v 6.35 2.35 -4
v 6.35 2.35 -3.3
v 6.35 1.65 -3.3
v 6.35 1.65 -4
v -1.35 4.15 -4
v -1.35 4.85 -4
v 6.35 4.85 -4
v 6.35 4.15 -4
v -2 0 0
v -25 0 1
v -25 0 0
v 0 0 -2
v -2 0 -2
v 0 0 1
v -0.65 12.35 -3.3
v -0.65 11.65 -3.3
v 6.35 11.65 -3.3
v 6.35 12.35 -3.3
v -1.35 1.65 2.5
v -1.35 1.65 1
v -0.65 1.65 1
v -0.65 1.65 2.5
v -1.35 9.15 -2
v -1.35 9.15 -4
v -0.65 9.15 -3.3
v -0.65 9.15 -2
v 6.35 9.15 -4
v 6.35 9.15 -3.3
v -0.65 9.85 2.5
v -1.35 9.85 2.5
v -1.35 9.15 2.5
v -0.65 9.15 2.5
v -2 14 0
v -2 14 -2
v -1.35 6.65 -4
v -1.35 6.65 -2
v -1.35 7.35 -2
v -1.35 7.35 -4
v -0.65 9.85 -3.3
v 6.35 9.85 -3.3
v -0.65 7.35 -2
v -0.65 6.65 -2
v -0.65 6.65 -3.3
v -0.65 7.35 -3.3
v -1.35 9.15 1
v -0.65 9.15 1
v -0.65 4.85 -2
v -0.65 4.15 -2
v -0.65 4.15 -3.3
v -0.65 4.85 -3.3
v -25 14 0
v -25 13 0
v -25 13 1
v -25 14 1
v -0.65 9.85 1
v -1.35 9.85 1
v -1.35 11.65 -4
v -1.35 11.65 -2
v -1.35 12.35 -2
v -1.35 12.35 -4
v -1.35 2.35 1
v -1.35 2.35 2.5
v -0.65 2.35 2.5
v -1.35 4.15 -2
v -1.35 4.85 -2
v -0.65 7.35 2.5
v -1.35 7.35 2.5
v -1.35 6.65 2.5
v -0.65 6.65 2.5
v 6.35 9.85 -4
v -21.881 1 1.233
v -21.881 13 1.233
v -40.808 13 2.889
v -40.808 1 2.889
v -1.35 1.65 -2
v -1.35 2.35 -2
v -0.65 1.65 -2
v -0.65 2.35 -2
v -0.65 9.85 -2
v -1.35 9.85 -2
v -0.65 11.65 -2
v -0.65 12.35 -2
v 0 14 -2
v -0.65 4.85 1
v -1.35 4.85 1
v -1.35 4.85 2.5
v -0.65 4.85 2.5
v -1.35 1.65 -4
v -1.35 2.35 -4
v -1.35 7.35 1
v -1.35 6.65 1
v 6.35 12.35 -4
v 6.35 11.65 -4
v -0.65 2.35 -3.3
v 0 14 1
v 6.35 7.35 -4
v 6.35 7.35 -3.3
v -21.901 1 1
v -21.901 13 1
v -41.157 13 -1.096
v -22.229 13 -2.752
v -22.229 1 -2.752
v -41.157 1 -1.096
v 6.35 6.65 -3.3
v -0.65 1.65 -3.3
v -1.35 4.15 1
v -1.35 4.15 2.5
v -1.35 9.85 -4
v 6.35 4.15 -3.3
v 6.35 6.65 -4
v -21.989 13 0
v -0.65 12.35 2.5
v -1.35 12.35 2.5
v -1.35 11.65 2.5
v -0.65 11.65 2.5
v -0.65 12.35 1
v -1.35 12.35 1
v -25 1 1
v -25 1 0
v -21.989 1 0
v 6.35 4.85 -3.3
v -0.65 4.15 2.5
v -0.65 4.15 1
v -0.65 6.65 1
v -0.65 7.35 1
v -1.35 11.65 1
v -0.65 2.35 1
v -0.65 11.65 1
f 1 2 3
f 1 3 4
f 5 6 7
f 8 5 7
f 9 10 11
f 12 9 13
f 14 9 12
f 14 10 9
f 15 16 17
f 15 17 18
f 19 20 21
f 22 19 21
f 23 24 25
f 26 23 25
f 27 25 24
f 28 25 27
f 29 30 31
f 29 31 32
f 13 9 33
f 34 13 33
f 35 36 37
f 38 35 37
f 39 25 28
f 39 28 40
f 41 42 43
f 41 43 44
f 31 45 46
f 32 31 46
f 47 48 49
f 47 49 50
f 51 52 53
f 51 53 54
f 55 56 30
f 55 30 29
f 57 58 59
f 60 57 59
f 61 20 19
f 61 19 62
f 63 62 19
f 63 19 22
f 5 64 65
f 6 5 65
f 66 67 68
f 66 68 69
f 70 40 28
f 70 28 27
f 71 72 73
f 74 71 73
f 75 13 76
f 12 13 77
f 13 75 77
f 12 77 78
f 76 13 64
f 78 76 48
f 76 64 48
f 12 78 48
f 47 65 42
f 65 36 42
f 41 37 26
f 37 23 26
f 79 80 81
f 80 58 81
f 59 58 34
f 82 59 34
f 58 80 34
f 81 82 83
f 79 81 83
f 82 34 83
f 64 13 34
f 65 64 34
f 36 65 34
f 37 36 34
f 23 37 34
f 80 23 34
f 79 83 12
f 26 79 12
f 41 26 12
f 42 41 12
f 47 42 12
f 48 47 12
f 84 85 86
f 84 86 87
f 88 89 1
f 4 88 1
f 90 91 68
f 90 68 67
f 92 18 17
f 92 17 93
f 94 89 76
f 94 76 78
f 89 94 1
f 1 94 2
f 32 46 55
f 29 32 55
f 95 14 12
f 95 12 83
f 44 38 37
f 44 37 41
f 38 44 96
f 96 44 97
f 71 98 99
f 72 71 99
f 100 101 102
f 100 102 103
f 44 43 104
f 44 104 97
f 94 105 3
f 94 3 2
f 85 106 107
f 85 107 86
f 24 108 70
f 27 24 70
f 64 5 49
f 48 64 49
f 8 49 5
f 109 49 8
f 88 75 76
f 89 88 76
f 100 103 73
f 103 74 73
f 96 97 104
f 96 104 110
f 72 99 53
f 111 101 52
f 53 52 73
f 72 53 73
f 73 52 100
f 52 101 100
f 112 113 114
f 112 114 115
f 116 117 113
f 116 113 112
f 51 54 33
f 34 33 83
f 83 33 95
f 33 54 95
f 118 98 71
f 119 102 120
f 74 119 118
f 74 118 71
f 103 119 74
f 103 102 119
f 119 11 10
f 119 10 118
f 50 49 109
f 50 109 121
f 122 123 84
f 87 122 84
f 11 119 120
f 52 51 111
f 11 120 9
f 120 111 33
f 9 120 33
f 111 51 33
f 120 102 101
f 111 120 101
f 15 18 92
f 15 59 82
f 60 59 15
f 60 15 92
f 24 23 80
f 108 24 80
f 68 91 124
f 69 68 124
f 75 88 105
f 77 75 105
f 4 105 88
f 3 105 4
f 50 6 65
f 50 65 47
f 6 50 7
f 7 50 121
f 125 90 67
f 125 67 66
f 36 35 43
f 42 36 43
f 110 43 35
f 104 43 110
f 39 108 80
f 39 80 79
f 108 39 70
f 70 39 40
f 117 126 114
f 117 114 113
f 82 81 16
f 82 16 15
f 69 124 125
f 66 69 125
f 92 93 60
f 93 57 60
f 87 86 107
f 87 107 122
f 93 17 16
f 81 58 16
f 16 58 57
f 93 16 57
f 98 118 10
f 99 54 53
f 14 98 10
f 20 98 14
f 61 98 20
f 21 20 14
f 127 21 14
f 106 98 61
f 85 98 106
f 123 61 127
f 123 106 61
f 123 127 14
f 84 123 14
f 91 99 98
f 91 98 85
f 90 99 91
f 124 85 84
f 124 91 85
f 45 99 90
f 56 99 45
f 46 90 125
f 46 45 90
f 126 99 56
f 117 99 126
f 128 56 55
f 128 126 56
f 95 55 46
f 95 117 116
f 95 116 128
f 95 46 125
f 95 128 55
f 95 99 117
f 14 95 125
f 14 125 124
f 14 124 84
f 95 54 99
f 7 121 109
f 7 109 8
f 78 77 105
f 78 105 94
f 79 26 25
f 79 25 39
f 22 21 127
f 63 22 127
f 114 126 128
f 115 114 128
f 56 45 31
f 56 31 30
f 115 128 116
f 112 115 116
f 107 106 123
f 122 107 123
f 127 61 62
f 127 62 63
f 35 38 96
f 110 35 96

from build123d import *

# Parameters (mm, degrees)
SKETCH_1_W      = 25
SKETCH_1_H      = 14
EXTRUDE_1_DEPTH = 1
SKETCH_1_3_W    = 2
SKETCH_1_3_H    = 14
SKETCH_1_3_W_2  = 0.7
SKETCH_1_3_H_2  = 0.7
EXTRUDE_2_DEPTH = 2
SKETCH_1_4_W    = 0.7
SKETCH_1_4_H    = 0.7
EXTRUDE_3_DEPTH = 2.5
SKETCH_1_5_W    = 0.7
SKETCH_1_5_H    = 0.7
EXTRUDE_4_DEPTH = 4
SKETCH_2_W      = 0.7
SKETCH_2_H      = 0.7
EXTRUDE_5_DEPTH = 7
SKETCH_4_W      = 19
SKETCH_4_H      = 12
EXTRUDE_6_DEPTH = 2.5
SKETCH_4_2_W    = 19
SKETCH_4_2_H    = 12
EXTRUDE_7_DEPTH = 1.5


with BuildPart() as part:
    # Эскиз1 → Бобышка-Вытянуть1 (new body)
    with BuildSketch(Plane.XY):
        with Locations((-12.5, 7)):
            Rectangle(SKETCH_1_W, SKETCH_1_H)
    extrude(amount=EXTRUDE_1_DEPTH)

    # Эскиз1<3> → Бобышка-Вытянуть2 (add)
    with BuildSketch(Plane.XY):
        with Locations((-1, 7)):
            Rectangle(SKETCH_1_3_W, SKETCH_1_3_H)
        with Locations((-1, 2)):
            Rectangle(SKETCH_1_3_W_2, SKETCH_1_3_H_2, mode=Mode.SUBTRACT)
        with Locations((-1, 4.5)):
            Rectangle(SKETCH_1_3_W_2, SKETCH_1_3_H_2, mode=Mode.SUBTRACT)
        with Locations((-1, 7)):
            Rectangle(SKETCH_1_3_W_2, SKETCH_1_3_H_2, mode=Mode.SUBTRACT)
        with Locations((-1, 9.5)):
            Rectangle(SKETCH_1_3_W_2, SKETCH_1_3_H_2, mode=Mode.SUBTRACT)
        with Locations((-1, 12)):
            Rectangle(SKETCH_1_3_W_2, SKETCH_1_3_H_2, mode=Mode.SUBTRACT)
    extrude(amount=-EXTRUDE_2_DEPTH)

    # Эскиз1<4> → Бобышка-Вытянуть3 (add)
    with BuildSketch(Plane.XY):
        with Locations((-1, 4.5)):
            Rectangle(SKETCH_1_4_W, SKETCH_1_4_H)
        with Locations((-1, 2)):
            Rectangle(SKETCH_1_4_W, SKETCH_1_4_H)
        with Locations((-1, 7)):
            Rectangle(SKETCH_1_4_W, SKETCH_1_4_H)
        with Locations((-1, 9.5)):
            Rectangle(SKETCH_1_4_W, SKETCH_1_4_H)
        with Locations((-1, 12)):
            Rectangle(SKETCH_1_4_W, SKETCH_1_4_H)
    extrude(amount=EXTRUDE_3_DEPTH)

    # Эскиз1<5> → Бобышка-Вытянуть4 (add)
    with BuildSketch(Plane.XY):
        with Locations((-1, 4.5)):
            Rectangle(SKETCH_1_5_W, SKETCH_1_5_H)
        with Locations((-1, 2)):
            Rectangle(SKETCH_1_5_W, SKETCH_1_5_H)
        with Locations((-1, 7)):
            Rectangle(SKETCH_1_5_W, SKETCH_1_5_H)
        with Locations((-1, 9.5)):
            Rectangle(SKETCH_1_5_W, SKETCH_1_5_H)
        with Locations((-1, 12)):
            Rectangle(SKETCH_1_5_W, SKETCH_1_5_H)
    extrude(amount=-EXTRUDE_4_DEPTH)

    # Эскиз2 → Бобышка-Вытянуть5 (add)
    with BuildSketch(Plane(origin=(-0.65, 0, 0), x_dir=(0, 0, -1), z_dir=(1, 0, 0))):
        with Locations((3.65, 12)):
            Rectangle(SKETCH_2_W, SKETCH_2_H)
        with Locations((3.65, 9.5)):
            Rectangle(SKETCH_2_W, SKETCH_2_H)
        with Locations((3.65, 7)):
            Rectangle(SKETCH_2_W, SKETCH_2_H)
        with Locations((3.65, 4.5)):
            Rectangle(SKETCH_2_W, SKETCH_2_H)
        with Locations((3.65, 2)):
            Rectangle(SKETCH_2_W, SKETCH_2_H)
    extrude(amount=EXTRUDE_5_DEPTH)



with BuildPart() as body_2:
    # Эскиз4 → Бобышка-Вытянуть6 (new body)
    with BuildSketch(Plane(origin=(-0.189903087, 0, -2.170602221), x_dir=(-0.9961946980917455, 0, 0.08715574274765837), z_dir=(-0.08715574274765839, 0, -0.9961946980917457))):
        with Locations((31.404867452, 7)):
            Rectangle(SKETCH_4_W, SKETCH_4_H)
    extrude(amount=EXTRUDE_6_DEPTH)


with BuildPart() as part_1:
    add(part.part)

    add(body_2.part)  # Бобышка-Вытянуть7 merges body 2
    # Эскиз4<2> → Бобышка-Вытянуть7 (add)
    with BuildSketch(Plane(origin=(-0.189903087, 0, -2.170602221), x_dir=(-0.9961946980917455, 0, 0.08715574274765837), z_dir=(-0.08715574274765839, 0, -0.9961946980917457))):
        with Locations((31.404867452, 7)):
            Rectangle(SKETCH_4_2_W, SKETCH_4_2_H)
    extrude(amount=-EXTRUDE_7_DEPTH)


solid = part_1.part
